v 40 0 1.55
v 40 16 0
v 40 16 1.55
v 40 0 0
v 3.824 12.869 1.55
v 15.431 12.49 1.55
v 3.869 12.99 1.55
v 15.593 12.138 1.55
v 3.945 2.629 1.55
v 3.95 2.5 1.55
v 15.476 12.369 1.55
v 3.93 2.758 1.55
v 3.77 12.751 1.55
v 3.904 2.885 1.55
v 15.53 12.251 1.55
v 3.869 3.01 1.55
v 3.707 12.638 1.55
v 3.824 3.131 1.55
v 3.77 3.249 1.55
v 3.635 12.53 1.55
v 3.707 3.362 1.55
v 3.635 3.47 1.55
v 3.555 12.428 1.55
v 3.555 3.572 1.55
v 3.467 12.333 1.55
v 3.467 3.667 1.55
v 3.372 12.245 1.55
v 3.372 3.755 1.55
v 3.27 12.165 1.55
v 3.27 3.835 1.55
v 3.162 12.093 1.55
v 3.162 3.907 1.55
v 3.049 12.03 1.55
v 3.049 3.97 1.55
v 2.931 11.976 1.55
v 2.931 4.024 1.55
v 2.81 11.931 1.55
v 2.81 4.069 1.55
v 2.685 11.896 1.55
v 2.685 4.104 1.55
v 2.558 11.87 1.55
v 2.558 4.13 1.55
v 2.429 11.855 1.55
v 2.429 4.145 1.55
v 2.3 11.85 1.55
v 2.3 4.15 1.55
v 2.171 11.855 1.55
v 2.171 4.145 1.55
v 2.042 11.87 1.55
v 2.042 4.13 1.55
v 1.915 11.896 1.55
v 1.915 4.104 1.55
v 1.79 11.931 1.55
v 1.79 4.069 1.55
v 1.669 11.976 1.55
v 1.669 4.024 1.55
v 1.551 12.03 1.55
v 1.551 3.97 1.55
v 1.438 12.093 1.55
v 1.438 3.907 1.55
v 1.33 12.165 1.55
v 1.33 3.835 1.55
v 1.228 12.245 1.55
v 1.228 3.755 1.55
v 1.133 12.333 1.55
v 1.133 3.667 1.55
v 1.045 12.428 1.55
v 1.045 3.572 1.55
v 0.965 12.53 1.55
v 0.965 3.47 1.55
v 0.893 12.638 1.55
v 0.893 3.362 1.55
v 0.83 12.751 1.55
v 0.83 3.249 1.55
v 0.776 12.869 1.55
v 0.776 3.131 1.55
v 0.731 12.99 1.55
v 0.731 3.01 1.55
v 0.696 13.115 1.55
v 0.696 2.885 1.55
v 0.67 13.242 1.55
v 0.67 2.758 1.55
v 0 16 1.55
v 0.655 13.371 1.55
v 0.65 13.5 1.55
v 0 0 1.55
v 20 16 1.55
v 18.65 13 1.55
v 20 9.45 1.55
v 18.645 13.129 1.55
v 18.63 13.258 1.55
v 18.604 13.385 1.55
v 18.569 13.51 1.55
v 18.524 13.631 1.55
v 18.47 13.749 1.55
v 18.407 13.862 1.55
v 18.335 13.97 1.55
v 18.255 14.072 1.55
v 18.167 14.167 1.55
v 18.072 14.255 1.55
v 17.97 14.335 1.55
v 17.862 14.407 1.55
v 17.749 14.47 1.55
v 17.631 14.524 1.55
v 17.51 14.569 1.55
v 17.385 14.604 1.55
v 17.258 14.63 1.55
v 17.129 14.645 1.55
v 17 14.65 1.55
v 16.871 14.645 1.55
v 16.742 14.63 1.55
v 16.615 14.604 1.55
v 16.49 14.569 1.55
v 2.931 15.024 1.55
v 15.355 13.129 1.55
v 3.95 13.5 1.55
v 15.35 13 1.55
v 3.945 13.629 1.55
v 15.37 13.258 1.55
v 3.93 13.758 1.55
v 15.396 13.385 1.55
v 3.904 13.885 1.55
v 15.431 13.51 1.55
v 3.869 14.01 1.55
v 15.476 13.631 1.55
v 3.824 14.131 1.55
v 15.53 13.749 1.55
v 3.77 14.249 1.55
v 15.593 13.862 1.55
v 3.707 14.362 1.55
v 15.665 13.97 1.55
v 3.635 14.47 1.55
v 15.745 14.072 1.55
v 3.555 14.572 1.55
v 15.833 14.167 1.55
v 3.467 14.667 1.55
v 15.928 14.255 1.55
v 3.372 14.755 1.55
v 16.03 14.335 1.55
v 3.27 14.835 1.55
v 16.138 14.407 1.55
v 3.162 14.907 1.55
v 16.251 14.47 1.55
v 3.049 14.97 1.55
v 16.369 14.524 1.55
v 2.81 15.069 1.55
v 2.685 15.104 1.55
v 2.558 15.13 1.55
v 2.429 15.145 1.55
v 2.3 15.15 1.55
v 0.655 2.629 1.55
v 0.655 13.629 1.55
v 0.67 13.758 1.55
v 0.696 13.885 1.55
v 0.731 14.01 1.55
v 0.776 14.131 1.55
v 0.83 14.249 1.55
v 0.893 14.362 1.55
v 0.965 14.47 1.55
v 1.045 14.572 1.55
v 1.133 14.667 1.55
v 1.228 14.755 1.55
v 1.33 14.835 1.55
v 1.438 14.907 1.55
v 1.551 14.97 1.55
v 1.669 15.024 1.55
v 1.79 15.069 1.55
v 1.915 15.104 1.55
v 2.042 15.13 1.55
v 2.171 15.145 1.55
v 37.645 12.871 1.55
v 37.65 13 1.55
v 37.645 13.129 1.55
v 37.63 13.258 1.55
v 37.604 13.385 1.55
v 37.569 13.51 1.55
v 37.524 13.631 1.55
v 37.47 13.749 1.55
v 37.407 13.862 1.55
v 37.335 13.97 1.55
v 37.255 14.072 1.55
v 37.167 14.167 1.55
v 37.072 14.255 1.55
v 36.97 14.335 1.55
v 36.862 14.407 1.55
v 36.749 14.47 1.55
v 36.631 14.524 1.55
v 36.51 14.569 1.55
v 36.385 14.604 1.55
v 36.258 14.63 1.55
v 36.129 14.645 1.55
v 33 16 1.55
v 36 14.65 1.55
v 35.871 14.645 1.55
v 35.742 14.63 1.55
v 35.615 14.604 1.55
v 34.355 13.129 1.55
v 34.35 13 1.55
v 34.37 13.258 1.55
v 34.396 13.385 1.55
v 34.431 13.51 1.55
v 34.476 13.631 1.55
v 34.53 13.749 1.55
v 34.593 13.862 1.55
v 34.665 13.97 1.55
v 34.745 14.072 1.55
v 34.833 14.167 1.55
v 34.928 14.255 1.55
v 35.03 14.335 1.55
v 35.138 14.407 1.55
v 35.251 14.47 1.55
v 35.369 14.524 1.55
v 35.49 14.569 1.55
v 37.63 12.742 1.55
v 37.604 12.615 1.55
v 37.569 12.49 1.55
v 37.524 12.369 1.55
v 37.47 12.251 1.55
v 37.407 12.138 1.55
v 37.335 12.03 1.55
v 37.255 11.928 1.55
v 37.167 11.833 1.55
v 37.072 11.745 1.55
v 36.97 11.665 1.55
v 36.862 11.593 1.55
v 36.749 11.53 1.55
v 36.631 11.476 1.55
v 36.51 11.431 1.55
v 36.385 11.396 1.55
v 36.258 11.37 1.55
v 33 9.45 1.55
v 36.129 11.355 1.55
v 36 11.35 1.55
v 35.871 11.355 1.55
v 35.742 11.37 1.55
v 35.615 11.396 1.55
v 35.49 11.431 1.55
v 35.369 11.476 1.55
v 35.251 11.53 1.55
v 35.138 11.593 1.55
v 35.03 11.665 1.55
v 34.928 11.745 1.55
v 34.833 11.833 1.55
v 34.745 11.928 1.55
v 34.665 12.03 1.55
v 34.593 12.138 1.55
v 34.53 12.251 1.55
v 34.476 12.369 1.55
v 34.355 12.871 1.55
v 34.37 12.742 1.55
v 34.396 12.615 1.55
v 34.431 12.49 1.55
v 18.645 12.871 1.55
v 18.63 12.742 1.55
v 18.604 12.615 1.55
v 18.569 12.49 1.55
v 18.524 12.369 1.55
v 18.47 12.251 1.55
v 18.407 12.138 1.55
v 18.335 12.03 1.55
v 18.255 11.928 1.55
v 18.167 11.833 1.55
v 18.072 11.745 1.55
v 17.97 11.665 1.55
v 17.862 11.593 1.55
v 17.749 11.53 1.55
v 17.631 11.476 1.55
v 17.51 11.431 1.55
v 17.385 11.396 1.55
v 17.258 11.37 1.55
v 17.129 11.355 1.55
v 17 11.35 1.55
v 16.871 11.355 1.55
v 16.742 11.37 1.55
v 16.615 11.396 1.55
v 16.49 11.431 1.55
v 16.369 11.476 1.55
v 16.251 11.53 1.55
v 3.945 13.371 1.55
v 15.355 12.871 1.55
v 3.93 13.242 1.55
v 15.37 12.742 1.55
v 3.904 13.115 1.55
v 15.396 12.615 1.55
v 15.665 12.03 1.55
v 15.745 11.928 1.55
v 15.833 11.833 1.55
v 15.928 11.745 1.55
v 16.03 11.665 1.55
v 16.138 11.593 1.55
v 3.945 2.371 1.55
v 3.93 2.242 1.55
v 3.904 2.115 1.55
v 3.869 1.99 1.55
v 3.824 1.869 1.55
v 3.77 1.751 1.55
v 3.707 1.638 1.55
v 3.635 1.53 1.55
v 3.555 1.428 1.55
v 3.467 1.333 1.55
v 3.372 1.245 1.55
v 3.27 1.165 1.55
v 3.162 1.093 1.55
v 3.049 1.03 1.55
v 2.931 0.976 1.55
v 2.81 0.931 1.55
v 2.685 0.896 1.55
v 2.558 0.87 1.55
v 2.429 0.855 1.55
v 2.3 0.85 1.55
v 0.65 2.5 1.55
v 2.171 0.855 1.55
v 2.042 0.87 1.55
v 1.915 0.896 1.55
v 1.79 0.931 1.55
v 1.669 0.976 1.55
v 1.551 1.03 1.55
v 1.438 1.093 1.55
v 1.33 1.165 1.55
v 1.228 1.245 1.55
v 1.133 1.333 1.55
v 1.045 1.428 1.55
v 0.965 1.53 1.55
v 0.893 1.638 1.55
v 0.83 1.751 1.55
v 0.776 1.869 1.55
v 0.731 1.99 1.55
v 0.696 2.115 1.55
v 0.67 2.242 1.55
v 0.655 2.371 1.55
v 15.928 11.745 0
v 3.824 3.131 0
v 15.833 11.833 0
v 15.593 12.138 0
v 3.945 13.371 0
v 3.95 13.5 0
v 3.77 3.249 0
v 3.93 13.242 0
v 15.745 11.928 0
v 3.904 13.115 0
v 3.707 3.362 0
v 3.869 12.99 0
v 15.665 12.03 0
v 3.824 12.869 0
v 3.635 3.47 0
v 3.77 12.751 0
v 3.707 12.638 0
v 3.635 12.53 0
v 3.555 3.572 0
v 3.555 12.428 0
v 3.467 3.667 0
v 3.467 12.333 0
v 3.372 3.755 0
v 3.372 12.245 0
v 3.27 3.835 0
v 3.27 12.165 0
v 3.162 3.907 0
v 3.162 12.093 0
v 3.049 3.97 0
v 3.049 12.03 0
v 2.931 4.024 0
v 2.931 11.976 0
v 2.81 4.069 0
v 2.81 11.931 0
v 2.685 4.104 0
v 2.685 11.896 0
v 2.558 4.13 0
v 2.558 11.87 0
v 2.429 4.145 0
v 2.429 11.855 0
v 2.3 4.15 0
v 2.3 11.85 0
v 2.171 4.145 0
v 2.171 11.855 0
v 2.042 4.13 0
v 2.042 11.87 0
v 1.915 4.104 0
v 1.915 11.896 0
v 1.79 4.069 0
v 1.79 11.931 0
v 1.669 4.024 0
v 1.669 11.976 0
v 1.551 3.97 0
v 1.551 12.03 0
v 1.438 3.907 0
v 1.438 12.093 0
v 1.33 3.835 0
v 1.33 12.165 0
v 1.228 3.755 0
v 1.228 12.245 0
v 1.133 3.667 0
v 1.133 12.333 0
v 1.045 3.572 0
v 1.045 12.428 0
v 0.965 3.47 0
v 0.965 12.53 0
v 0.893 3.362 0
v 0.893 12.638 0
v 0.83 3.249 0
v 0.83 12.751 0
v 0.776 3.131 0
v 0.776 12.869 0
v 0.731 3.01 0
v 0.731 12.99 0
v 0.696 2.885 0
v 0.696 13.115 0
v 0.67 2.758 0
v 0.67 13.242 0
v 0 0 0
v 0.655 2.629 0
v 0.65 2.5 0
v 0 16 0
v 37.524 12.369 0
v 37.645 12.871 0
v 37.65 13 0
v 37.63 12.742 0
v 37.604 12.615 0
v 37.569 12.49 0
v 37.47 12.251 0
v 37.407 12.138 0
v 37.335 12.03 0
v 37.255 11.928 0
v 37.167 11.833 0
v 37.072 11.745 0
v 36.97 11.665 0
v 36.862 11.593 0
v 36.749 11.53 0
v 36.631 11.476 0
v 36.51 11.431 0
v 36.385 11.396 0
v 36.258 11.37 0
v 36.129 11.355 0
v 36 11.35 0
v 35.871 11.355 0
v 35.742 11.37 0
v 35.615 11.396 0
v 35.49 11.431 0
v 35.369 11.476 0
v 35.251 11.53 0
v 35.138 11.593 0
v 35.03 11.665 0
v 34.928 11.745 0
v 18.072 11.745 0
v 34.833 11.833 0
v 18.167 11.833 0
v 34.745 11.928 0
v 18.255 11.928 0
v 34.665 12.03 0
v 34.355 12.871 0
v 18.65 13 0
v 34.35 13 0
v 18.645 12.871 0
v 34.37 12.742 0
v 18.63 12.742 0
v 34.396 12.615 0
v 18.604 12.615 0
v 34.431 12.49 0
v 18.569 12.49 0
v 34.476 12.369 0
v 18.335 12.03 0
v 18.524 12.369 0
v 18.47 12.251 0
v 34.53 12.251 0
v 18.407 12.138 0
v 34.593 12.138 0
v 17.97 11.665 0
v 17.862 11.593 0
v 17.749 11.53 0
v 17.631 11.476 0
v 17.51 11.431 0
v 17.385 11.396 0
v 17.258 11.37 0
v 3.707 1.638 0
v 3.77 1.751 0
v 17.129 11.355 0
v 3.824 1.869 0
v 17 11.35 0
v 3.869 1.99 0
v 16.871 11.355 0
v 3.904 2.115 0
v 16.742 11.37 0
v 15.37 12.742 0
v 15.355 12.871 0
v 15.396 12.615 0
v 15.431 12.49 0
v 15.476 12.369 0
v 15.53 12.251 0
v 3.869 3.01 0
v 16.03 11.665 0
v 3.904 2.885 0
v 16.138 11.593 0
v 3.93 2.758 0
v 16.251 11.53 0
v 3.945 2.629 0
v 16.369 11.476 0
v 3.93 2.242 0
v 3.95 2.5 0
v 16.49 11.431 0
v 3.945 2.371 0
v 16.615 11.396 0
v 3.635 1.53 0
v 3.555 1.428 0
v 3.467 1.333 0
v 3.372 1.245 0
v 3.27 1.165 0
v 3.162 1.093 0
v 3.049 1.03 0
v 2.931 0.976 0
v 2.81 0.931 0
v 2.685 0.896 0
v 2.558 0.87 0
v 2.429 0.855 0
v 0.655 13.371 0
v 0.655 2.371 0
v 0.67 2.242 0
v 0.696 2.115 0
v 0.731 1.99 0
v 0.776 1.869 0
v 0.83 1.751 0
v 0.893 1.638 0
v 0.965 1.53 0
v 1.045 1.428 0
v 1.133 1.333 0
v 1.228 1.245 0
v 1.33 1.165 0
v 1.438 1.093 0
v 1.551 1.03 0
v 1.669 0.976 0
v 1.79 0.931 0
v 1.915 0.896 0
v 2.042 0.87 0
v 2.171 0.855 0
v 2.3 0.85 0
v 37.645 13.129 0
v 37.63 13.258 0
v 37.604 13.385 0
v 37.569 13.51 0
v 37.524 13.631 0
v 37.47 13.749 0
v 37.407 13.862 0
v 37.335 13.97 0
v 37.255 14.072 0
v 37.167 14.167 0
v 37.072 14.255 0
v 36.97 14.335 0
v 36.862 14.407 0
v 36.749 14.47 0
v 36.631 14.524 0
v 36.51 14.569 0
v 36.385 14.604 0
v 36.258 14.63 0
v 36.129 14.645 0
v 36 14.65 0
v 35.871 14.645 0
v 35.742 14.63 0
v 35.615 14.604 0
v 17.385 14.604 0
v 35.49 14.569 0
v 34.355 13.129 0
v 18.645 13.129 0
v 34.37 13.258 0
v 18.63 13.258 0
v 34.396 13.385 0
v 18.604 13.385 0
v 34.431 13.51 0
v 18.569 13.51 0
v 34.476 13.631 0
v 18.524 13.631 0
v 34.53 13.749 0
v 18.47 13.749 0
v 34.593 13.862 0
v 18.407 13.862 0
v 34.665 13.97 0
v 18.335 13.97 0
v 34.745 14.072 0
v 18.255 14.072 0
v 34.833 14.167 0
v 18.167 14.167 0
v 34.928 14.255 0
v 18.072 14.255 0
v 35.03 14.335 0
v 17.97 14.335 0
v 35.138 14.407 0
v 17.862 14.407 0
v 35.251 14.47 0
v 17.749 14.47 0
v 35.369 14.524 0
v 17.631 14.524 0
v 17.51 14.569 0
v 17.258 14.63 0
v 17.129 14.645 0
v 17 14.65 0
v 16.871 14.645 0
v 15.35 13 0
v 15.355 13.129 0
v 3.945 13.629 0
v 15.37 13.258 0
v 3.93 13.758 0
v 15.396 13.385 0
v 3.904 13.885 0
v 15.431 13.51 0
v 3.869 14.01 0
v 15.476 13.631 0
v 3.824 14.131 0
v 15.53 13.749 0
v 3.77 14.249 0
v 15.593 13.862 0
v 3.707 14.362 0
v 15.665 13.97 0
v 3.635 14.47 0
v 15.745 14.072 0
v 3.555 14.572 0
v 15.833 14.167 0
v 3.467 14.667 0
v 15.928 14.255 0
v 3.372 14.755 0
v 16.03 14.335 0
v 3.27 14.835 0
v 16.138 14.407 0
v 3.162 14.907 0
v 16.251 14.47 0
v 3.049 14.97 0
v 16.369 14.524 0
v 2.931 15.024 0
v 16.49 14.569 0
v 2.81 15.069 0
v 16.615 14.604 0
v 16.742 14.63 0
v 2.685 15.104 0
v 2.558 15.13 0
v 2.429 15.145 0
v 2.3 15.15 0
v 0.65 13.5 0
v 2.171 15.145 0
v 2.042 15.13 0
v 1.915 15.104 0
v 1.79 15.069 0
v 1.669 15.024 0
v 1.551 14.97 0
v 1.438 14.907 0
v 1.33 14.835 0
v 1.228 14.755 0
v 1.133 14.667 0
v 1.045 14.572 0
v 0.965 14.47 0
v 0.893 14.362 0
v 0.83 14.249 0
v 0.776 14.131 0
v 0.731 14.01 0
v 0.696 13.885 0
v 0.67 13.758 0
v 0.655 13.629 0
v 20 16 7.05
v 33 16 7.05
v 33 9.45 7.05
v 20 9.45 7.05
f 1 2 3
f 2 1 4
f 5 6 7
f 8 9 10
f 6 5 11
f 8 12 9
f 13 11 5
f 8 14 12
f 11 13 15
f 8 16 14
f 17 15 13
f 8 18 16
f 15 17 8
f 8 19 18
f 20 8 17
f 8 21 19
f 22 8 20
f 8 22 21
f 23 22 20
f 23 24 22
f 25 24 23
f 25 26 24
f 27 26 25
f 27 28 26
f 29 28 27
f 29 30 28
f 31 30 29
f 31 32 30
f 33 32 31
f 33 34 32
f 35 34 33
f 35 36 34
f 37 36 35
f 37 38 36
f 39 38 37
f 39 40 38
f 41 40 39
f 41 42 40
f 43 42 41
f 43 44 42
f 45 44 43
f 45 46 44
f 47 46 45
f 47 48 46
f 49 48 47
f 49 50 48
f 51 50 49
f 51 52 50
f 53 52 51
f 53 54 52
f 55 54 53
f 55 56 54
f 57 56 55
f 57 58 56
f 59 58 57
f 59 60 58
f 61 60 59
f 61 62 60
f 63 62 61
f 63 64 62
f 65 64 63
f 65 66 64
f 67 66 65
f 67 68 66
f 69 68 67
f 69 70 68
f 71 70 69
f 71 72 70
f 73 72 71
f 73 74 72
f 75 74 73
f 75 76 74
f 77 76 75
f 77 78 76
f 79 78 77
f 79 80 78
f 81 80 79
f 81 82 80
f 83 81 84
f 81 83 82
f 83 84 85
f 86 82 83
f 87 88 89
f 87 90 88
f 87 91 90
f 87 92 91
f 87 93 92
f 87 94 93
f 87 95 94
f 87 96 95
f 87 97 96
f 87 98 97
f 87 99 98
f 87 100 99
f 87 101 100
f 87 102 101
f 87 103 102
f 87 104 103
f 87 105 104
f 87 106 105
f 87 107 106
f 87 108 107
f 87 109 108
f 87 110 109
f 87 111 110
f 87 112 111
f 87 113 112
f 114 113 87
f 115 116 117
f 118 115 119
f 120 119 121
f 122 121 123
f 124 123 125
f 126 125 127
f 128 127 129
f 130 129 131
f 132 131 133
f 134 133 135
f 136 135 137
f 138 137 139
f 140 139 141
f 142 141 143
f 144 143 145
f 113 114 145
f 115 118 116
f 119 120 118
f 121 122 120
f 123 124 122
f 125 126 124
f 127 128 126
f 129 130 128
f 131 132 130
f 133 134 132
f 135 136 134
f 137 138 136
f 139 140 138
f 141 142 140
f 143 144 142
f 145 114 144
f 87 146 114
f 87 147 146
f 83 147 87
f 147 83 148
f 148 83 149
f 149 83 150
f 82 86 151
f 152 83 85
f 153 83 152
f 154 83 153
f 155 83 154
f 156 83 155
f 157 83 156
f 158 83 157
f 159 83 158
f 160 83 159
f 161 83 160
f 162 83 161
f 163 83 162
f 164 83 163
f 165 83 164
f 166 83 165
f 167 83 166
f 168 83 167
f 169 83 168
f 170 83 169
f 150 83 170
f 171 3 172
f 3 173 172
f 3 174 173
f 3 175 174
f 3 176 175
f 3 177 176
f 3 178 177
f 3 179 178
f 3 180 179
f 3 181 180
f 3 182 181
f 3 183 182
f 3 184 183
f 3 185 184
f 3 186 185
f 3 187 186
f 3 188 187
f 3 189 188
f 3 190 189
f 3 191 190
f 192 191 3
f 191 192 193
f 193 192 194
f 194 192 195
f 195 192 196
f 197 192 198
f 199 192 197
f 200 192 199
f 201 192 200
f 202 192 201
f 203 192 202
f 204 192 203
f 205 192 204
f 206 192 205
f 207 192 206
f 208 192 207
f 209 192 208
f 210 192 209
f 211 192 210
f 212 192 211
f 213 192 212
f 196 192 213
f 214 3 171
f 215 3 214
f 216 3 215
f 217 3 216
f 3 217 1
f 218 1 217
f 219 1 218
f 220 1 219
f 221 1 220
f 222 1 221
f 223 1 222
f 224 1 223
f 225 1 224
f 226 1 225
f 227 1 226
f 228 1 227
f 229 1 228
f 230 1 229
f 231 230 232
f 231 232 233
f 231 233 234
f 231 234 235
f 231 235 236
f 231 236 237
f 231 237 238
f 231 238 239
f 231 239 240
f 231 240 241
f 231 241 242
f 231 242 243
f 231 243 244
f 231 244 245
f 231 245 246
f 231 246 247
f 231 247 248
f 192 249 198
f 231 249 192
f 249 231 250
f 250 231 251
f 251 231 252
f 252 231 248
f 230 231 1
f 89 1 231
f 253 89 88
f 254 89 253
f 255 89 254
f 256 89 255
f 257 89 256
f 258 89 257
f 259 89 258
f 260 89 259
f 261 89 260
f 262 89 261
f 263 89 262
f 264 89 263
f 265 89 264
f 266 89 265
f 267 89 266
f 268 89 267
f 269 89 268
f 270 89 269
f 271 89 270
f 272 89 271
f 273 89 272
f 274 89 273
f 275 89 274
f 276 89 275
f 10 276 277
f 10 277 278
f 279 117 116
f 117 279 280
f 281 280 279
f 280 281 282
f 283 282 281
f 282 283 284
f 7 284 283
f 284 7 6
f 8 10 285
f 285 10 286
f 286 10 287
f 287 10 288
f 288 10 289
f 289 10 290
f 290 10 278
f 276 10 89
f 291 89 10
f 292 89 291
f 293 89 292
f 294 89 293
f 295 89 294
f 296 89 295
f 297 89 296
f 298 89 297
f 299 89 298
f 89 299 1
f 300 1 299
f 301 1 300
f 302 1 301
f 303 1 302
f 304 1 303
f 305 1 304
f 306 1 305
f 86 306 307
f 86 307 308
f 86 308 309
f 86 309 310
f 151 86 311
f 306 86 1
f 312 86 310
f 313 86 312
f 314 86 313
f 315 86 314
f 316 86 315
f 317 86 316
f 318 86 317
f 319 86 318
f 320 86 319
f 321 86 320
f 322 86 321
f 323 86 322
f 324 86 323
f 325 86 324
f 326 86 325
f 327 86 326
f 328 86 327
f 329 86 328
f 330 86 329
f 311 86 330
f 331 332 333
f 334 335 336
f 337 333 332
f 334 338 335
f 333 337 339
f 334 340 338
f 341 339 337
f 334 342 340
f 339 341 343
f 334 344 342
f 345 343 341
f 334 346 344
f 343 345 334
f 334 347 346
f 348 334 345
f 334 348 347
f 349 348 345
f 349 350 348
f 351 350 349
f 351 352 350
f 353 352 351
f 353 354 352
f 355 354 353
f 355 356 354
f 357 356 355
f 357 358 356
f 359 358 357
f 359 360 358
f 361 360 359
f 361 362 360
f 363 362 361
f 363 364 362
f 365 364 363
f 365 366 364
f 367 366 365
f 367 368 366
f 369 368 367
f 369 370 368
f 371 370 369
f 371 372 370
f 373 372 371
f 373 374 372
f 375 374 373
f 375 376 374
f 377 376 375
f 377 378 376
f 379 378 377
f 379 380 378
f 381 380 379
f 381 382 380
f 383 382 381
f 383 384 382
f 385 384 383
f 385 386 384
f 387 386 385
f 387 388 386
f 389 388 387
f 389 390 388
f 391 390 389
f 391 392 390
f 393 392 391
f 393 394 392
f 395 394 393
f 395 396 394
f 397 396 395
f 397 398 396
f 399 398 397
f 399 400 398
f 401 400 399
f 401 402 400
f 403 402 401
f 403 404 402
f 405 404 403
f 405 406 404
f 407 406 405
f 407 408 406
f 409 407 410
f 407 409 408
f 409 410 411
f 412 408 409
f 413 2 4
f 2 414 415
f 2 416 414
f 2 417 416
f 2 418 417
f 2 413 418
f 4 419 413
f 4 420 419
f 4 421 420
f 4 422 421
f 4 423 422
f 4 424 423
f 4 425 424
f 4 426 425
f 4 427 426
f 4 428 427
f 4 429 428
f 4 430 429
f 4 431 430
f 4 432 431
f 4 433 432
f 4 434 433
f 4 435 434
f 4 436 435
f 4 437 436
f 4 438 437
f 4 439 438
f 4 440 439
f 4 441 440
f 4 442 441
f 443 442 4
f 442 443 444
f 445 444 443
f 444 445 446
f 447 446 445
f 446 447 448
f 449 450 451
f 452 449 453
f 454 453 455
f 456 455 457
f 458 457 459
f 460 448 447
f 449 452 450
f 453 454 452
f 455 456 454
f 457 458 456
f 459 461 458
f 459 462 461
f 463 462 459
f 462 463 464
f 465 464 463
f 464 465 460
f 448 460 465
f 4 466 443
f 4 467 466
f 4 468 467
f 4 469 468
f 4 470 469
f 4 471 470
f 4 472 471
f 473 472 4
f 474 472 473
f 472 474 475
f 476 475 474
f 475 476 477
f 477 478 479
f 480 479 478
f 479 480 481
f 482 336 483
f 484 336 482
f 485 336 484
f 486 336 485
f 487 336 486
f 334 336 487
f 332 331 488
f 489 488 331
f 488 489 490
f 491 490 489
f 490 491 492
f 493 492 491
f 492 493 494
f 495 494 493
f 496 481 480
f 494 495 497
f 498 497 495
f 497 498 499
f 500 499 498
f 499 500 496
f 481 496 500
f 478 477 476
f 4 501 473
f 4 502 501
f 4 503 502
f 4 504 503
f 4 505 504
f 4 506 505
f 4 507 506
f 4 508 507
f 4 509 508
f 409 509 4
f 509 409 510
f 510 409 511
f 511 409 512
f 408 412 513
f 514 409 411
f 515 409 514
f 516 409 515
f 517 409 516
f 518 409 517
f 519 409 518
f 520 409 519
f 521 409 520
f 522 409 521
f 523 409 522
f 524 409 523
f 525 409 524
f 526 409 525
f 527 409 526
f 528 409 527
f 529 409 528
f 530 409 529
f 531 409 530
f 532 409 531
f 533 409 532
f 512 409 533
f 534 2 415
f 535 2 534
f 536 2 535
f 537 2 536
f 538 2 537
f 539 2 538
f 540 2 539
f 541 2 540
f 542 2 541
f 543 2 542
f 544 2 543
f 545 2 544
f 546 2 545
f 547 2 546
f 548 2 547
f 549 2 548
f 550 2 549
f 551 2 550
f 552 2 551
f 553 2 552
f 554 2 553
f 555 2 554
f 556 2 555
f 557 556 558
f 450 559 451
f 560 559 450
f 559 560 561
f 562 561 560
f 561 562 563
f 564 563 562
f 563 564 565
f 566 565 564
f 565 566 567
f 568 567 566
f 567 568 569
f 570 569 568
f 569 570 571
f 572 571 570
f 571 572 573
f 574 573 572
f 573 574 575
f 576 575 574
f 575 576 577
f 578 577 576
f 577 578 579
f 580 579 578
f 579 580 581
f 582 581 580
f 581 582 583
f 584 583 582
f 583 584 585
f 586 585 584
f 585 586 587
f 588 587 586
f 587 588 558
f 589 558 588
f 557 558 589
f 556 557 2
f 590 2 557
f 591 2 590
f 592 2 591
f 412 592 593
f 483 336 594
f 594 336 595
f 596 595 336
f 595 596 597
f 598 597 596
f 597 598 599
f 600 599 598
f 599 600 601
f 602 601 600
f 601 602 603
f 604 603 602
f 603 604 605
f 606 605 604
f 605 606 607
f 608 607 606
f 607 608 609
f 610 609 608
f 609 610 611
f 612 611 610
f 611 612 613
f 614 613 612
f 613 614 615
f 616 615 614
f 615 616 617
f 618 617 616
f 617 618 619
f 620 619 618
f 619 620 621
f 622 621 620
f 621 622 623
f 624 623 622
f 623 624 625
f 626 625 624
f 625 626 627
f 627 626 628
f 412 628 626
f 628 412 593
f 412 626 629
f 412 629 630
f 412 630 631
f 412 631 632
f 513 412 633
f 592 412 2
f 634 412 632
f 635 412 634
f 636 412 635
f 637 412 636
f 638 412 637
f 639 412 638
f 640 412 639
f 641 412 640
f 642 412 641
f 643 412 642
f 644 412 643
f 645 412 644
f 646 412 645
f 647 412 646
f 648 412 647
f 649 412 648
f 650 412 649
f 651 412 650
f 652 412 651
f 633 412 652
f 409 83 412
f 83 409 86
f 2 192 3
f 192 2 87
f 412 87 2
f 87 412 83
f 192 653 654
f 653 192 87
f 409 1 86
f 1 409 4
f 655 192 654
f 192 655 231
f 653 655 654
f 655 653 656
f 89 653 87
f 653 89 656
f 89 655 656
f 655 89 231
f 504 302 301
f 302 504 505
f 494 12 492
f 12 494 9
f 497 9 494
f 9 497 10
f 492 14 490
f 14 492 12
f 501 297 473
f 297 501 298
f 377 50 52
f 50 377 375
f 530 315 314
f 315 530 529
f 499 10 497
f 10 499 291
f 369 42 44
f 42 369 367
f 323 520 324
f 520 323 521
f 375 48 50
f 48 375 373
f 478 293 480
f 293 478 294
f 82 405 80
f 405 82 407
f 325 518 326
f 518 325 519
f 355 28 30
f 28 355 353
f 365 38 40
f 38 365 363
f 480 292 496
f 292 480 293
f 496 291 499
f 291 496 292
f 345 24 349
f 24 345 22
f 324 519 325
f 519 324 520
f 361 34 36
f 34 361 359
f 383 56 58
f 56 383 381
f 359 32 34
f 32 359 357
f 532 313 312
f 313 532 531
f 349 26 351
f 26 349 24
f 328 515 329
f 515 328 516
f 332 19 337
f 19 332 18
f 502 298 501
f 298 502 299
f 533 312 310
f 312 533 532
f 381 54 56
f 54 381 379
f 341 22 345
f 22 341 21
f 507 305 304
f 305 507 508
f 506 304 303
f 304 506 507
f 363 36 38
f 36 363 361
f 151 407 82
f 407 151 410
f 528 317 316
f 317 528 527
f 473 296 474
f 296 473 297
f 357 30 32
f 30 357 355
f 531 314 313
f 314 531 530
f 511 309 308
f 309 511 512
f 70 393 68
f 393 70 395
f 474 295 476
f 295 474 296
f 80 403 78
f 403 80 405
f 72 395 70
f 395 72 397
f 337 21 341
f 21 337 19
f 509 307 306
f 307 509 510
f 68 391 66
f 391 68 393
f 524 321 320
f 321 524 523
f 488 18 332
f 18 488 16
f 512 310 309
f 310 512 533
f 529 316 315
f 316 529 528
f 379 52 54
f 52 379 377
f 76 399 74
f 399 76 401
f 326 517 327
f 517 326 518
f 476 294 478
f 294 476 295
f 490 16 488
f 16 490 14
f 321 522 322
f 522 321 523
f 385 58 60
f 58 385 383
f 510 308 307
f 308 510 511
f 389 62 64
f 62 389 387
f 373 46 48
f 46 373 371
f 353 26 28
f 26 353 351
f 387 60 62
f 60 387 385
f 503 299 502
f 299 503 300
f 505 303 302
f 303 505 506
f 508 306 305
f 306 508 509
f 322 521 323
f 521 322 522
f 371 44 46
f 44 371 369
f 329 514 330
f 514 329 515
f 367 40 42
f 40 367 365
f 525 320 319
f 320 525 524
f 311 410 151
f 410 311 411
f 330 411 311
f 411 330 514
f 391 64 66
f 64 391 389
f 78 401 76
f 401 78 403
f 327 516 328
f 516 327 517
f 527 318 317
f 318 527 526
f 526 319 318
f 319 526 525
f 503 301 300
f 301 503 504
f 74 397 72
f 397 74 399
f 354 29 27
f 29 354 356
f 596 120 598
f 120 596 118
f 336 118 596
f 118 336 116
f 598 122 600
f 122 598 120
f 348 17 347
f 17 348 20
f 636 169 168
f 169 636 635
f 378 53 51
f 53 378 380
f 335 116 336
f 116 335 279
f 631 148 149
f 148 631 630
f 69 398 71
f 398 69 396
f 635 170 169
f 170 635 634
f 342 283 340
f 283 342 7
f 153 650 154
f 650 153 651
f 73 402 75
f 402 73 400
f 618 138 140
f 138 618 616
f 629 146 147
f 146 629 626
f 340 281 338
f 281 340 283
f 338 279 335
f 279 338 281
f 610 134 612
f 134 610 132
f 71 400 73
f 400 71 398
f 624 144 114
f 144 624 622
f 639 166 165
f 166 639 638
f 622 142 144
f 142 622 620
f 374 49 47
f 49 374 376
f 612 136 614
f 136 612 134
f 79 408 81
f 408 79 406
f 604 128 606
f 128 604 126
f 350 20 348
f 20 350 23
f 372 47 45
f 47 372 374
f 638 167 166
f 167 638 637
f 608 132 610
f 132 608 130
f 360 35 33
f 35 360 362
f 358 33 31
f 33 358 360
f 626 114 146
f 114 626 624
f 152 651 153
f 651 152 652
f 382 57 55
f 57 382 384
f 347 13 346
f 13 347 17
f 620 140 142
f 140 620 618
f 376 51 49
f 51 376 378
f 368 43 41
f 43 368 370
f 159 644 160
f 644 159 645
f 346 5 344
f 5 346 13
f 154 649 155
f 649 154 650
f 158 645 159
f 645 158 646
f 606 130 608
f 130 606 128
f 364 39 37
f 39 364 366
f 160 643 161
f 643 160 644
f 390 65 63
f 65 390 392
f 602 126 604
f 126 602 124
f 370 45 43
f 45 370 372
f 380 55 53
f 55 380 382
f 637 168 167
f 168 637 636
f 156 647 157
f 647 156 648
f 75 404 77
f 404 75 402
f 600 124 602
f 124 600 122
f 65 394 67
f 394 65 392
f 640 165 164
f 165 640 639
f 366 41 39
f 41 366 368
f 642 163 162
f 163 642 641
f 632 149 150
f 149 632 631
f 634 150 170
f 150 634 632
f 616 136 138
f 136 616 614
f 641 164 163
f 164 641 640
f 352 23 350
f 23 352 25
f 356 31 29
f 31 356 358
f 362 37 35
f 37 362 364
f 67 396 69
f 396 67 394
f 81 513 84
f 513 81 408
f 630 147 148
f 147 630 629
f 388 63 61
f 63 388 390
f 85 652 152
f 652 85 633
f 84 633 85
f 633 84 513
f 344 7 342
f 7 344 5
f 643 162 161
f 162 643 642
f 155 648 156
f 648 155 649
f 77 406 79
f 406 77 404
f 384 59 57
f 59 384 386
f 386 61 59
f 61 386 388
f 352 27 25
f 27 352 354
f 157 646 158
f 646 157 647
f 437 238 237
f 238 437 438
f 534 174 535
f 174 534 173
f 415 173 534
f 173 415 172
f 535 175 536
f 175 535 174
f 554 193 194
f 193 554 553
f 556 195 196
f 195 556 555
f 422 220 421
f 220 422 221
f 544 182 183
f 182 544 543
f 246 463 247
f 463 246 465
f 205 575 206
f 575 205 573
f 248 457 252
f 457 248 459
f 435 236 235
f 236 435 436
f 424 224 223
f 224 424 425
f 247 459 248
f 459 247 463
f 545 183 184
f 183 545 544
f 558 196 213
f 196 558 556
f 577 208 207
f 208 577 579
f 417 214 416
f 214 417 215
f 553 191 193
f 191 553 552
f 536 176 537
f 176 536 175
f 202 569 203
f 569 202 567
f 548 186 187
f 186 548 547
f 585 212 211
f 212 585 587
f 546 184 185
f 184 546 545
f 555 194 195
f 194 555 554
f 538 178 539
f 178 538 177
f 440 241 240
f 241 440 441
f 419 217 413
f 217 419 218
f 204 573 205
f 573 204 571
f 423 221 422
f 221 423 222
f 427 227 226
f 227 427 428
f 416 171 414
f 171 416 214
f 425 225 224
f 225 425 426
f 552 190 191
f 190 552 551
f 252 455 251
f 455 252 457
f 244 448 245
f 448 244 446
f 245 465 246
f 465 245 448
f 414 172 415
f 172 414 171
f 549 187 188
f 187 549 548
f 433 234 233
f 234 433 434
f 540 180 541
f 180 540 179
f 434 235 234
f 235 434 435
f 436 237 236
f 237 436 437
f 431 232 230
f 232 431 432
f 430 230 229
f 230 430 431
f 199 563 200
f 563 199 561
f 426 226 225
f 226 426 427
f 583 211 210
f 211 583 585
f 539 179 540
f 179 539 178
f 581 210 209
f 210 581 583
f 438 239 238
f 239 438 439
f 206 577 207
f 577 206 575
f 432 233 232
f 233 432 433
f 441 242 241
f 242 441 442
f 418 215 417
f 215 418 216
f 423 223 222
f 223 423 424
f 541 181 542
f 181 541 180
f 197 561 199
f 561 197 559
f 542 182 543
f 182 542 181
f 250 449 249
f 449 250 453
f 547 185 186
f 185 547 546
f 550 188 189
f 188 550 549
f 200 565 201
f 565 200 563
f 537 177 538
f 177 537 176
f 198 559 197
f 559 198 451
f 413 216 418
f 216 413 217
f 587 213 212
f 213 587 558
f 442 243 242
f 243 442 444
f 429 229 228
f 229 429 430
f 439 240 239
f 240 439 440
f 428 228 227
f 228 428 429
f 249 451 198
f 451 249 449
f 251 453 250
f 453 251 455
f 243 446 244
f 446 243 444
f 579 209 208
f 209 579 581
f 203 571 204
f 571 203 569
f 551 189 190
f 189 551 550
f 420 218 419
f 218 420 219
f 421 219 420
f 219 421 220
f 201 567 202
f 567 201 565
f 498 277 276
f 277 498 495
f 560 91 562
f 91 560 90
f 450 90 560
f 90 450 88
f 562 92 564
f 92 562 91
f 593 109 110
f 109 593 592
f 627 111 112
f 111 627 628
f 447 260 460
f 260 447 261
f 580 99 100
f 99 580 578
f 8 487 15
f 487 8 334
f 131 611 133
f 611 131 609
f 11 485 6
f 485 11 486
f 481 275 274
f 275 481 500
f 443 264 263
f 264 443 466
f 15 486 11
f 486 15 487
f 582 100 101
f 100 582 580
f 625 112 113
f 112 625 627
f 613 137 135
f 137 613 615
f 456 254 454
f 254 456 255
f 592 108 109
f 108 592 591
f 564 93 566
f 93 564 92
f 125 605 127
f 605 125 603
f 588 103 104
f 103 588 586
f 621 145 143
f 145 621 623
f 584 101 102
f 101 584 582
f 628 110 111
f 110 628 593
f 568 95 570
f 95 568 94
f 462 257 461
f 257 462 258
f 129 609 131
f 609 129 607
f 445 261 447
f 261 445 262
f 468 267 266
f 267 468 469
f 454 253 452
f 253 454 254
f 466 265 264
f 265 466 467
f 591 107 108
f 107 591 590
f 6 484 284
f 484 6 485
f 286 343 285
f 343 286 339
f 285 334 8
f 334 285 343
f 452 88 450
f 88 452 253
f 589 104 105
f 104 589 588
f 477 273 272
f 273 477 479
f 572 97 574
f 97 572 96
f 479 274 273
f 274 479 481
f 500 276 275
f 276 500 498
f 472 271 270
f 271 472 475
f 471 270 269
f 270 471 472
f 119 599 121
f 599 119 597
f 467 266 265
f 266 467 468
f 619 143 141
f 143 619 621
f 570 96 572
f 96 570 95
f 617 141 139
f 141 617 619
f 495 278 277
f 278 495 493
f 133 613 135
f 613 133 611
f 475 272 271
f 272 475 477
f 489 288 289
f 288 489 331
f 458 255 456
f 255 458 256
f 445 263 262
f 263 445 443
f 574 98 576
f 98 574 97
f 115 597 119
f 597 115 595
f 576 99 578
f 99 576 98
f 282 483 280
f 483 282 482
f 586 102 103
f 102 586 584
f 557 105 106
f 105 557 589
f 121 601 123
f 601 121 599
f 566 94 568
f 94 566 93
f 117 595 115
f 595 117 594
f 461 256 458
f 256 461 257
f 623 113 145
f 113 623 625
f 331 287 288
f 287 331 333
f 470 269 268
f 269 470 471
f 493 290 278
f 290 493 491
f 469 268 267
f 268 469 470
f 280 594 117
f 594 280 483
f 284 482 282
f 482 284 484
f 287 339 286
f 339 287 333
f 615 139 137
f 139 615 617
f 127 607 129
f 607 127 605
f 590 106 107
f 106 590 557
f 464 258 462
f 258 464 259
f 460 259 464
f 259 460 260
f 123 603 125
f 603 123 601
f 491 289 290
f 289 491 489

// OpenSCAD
module rrd_switch()
{
  $fn=80;
  difference() {
    union() {
      cube([40, 16, 1.55]);
      translate([-13/2+(36-19/2), 16-6.55, 1.55])
        cube([13, 6.55, 5.5]);
    }
    union() {
      for(y=[-11/2, 11/2])
      translate([2.3, 16/2+y, -1])
        cylinder(r=3.3/2, h=4);
      
      translate([36, 16-3, -1])
        cylinder(r=3.3/2, h=4);
      translate([36-19, 16-3, -1])
        cylinder(r=3.3/2, h=4);
    }
  }
}

rrd_switch();
